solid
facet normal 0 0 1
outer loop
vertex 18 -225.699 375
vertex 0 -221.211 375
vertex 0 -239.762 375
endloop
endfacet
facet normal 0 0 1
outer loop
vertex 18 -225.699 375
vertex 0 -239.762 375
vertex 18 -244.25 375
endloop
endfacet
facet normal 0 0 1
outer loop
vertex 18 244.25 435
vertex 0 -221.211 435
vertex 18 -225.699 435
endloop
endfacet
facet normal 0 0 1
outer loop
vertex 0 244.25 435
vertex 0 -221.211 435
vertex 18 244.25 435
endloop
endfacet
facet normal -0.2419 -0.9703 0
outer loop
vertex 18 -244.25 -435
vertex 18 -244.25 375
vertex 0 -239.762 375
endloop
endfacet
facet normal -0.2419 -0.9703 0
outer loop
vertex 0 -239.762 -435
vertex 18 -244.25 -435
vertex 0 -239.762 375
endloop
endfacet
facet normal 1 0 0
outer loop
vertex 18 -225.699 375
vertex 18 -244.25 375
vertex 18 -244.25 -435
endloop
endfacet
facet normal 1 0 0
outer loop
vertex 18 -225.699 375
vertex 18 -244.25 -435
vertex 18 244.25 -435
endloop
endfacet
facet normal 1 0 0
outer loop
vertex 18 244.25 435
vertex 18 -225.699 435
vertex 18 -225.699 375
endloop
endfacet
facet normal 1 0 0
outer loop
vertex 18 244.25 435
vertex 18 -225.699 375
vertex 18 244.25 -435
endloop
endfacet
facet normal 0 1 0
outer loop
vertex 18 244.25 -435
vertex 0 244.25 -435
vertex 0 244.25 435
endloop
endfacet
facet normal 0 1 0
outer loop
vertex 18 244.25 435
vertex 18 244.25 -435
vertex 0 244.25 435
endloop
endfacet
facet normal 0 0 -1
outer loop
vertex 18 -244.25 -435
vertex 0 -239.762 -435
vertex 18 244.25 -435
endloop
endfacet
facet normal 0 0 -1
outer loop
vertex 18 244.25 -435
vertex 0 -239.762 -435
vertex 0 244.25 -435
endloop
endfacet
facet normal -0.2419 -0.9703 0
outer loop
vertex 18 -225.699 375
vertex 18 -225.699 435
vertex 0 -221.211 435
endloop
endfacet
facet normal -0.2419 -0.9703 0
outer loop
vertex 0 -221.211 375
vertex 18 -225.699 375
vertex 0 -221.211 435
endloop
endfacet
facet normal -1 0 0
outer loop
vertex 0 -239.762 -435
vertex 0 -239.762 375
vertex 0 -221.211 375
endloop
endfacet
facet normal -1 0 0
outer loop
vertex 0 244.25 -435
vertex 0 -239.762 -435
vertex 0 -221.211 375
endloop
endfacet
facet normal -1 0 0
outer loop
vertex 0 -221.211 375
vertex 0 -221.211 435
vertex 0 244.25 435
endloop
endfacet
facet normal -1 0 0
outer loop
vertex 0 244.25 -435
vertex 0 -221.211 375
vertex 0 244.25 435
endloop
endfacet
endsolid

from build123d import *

# Parameters (mm, degrees)
F0_W     = 488.5
F0_H     = 870
F1_DEPTH = 18
F3_DEPTH = 870
F5_DEPTH = 60


with BuildPart() as f1:
    # F0 (on Right) → F1 (new body)
    with BuildSketch(Plane.YZ):
        Rectangle(F0_W, F0_H)
    extrude(amount=F1_DEPTH)

    # F2 (on face) → F3 (cut)
    with BuildSketch(Plane.XY.offset(435)):
        Polygon((0, -244.25), (18, -244.25), (0, -239.762096), align=None)
    extrude(amount=-F3_DEPTH, mode=Mode.SUBTRACT)

    # F4 (on face) → F5 (cut)
    with BuildSketch(Plane.XY.offset(435)):
        Polygon((0, -221.211051), (0, -239.762096), (18, -244.25), (18, -225.698955), align=None)
    extrude(amount=-F5_DEPTH, mode=Mode.SUBTRACT)


solid = f1.part
